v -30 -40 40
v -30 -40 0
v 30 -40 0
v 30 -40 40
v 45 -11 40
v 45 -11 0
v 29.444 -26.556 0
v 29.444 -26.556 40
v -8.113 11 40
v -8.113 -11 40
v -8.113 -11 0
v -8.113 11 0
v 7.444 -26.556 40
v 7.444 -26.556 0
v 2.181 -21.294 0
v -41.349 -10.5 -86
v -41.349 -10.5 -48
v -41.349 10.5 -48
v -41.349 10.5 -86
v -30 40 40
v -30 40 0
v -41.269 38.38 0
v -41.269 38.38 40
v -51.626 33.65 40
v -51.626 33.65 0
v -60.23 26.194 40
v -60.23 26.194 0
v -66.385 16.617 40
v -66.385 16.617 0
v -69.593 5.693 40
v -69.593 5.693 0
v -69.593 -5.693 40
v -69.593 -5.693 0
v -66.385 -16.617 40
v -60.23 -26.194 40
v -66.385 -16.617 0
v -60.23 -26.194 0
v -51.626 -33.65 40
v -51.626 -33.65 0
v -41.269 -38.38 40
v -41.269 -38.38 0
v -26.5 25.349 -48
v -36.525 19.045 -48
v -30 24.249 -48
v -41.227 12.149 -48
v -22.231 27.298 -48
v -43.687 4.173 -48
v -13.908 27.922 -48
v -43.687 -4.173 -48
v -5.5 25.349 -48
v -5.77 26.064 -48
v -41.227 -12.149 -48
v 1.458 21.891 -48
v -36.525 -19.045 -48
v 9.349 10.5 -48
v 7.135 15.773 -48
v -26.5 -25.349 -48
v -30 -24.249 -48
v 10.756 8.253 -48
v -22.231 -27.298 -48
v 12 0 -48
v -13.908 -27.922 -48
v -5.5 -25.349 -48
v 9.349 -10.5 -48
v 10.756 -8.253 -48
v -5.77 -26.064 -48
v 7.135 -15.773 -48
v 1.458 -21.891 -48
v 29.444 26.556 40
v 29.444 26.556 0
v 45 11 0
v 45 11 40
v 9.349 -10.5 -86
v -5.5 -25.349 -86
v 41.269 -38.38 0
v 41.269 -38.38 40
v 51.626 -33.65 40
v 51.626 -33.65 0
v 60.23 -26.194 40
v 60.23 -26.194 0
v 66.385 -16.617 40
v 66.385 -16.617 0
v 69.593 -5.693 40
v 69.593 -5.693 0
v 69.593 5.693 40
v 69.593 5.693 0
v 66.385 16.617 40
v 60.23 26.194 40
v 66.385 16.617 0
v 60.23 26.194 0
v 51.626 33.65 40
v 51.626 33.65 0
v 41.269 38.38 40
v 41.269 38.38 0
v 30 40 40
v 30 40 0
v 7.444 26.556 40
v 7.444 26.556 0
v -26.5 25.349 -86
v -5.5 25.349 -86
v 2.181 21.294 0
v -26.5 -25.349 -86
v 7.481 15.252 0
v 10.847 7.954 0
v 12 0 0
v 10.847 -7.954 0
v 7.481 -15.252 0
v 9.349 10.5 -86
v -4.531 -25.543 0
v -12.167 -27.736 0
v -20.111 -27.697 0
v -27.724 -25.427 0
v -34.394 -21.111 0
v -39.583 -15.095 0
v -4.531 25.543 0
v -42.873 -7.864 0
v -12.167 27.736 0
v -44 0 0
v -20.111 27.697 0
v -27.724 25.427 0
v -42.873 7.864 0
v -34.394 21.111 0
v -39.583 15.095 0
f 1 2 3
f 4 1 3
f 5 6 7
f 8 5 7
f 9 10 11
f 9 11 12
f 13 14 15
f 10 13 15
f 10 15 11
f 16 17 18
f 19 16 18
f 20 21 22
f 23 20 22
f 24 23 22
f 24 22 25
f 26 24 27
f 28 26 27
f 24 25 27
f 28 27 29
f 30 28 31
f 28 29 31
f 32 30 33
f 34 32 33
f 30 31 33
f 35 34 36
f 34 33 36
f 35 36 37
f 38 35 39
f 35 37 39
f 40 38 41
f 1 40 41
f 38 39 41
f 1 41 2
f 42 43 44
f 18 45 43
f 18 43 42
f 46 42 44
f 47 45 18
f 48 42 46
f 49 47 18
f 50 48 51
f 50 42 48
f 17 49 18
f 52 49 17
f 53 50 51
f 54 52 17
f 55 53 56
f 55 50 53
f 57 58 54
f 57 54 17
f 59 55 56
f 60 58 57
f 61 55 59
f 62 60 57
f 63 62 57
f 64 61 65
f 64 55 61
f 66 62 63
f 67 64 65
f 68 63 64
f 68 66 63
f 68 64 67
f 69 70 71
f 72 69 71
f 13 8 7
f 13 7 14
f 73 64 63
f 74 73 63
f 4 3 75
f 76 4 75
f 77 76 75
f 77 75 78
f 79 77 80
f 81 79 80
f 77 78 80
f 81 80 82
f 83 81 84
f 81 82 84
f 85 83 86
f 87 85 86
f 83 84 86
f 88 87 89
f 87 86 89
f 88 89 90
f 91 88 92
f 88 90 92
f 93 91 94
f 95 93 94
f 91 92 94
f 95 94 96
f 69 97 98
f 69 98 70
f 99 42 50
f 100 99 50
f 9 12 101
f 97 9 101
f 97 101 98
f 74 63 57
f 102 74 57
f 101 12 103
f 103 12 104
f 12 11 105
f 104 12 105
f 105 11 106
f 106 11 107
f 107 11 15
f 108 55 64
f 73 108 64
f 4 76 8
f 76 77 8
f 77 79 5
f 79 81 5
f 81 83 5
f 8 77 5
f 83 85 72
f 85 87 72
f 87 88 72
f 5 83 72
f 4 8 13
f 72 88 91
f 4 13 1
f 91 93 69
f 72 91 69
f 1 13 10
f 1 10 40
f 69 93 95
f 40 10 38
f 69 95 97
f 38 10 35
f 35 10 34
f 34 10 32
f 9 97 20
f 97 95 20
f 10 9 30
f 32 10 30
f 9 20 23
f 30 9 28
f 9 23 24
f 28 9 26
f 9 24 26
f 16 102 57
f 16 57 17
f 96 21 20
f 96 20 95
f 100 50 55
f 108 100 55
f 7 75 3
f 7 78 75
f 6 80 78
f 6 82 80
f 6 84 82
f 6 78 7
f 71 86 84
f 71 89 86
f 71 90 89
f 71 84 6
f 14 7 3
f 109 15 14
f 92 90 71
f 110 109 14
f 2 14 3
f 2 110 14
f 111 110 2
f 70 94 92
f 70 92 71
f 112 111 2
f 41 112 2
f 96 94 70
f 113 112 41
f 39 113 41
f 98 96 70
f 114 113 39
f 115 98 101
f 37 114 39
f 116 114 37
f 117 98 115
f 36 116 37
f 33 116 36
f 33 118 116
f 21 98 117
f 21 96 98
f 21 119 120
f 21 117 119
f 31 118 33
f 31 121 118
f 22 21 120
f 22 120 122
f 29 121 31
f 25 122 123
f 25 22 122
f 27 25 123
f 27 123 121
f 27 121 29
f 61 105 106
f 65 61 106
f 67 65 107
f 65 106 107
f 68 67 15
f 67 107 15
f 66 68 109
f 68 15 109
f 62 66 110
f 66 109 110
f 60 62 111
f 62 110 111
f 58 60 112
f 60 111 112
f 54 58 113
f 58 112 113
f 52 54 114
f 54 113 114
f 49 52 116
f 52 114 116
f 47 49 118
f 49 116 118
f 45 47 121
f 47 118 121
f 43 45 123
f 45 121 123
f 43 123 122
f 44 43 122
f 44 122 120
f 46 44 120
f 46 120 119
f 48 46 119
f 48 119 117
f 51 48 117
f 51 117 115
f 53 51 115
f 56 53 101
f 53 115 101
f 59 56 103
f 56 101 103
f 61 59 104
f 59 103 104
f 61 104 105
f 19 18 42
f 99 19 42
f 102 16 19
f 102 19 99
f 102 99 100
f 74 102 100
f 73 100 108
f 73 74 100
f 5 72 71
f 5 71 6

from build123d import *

# Parameters (mm, degrees)
PAD_DEPTH    = 40
POCKET_DEPTH = 100
SKETCH002_R  = 28
PAD001_DEPTH = 48
PAD002_DEPTH = 38


with BuildPart() as part:
    # Sketch → Pad (new body)
    with BuildSketch(Plane.XY):
        with BuildLine():
            Line((-30, 40), (30, 40))
            ThreePointArc((30, -40), (70, 0), (30, 40))
            Line((-30, -40), (30, -40))
            ThreePointArc((-30, 40), (-70, 0), (-30, -40))
        make_face()
    extrude(amount=PAD_DEPTH)

    # Sketch001 (on DatumPlane) → Pocket (cut)
    with BuildSketch(Plane(origin=(0, 0, 0), x_dir=(1, 0, 0), z_dir=(0, 0, -1))):
        Polygon((29.443651, -26.556349), (45, -11), (45, 11), (29.443651, 26.556349), (7.443651, 26.556349), (-8.112698, 11), (-8.112698, -11), (7.443651, -26.556349), align=None)
    extrude(amount=-POCKET_DEPTH, mode=Mode.SUBTRACT)

    # Sketch002 (on DatumPlane) → Pad001 (join)
    with BuildSketch(Plane(origin=(0, 0, 0), x_dir=(1, 0, 0), z_dir=(0, 0, -1))):
        with Locations((-16, 0)):
            Circle(SKETCH002_R)
    extrude(amount=PAD001_DEPTH)

    # Sketch003 (on DatumPlane) → Pad002 (join)
    with BuildSketch(Plane(origin=(0, 0, -48), x_dir=(1, 0, 0), z_dir=(0, 0, -1))):
        Polygon((-5.5, -25.349242), (9.349242, -10.5), (9.349242, 10.5), (-5.5, 25.349242), (-26.5, 25.349242), (-41.349242, 10.5), (-41.349242, -10.5), (-26.5, -25.349242), align=None)
    extrude(amount=PAD002_DEPTH)


solid = part.part
